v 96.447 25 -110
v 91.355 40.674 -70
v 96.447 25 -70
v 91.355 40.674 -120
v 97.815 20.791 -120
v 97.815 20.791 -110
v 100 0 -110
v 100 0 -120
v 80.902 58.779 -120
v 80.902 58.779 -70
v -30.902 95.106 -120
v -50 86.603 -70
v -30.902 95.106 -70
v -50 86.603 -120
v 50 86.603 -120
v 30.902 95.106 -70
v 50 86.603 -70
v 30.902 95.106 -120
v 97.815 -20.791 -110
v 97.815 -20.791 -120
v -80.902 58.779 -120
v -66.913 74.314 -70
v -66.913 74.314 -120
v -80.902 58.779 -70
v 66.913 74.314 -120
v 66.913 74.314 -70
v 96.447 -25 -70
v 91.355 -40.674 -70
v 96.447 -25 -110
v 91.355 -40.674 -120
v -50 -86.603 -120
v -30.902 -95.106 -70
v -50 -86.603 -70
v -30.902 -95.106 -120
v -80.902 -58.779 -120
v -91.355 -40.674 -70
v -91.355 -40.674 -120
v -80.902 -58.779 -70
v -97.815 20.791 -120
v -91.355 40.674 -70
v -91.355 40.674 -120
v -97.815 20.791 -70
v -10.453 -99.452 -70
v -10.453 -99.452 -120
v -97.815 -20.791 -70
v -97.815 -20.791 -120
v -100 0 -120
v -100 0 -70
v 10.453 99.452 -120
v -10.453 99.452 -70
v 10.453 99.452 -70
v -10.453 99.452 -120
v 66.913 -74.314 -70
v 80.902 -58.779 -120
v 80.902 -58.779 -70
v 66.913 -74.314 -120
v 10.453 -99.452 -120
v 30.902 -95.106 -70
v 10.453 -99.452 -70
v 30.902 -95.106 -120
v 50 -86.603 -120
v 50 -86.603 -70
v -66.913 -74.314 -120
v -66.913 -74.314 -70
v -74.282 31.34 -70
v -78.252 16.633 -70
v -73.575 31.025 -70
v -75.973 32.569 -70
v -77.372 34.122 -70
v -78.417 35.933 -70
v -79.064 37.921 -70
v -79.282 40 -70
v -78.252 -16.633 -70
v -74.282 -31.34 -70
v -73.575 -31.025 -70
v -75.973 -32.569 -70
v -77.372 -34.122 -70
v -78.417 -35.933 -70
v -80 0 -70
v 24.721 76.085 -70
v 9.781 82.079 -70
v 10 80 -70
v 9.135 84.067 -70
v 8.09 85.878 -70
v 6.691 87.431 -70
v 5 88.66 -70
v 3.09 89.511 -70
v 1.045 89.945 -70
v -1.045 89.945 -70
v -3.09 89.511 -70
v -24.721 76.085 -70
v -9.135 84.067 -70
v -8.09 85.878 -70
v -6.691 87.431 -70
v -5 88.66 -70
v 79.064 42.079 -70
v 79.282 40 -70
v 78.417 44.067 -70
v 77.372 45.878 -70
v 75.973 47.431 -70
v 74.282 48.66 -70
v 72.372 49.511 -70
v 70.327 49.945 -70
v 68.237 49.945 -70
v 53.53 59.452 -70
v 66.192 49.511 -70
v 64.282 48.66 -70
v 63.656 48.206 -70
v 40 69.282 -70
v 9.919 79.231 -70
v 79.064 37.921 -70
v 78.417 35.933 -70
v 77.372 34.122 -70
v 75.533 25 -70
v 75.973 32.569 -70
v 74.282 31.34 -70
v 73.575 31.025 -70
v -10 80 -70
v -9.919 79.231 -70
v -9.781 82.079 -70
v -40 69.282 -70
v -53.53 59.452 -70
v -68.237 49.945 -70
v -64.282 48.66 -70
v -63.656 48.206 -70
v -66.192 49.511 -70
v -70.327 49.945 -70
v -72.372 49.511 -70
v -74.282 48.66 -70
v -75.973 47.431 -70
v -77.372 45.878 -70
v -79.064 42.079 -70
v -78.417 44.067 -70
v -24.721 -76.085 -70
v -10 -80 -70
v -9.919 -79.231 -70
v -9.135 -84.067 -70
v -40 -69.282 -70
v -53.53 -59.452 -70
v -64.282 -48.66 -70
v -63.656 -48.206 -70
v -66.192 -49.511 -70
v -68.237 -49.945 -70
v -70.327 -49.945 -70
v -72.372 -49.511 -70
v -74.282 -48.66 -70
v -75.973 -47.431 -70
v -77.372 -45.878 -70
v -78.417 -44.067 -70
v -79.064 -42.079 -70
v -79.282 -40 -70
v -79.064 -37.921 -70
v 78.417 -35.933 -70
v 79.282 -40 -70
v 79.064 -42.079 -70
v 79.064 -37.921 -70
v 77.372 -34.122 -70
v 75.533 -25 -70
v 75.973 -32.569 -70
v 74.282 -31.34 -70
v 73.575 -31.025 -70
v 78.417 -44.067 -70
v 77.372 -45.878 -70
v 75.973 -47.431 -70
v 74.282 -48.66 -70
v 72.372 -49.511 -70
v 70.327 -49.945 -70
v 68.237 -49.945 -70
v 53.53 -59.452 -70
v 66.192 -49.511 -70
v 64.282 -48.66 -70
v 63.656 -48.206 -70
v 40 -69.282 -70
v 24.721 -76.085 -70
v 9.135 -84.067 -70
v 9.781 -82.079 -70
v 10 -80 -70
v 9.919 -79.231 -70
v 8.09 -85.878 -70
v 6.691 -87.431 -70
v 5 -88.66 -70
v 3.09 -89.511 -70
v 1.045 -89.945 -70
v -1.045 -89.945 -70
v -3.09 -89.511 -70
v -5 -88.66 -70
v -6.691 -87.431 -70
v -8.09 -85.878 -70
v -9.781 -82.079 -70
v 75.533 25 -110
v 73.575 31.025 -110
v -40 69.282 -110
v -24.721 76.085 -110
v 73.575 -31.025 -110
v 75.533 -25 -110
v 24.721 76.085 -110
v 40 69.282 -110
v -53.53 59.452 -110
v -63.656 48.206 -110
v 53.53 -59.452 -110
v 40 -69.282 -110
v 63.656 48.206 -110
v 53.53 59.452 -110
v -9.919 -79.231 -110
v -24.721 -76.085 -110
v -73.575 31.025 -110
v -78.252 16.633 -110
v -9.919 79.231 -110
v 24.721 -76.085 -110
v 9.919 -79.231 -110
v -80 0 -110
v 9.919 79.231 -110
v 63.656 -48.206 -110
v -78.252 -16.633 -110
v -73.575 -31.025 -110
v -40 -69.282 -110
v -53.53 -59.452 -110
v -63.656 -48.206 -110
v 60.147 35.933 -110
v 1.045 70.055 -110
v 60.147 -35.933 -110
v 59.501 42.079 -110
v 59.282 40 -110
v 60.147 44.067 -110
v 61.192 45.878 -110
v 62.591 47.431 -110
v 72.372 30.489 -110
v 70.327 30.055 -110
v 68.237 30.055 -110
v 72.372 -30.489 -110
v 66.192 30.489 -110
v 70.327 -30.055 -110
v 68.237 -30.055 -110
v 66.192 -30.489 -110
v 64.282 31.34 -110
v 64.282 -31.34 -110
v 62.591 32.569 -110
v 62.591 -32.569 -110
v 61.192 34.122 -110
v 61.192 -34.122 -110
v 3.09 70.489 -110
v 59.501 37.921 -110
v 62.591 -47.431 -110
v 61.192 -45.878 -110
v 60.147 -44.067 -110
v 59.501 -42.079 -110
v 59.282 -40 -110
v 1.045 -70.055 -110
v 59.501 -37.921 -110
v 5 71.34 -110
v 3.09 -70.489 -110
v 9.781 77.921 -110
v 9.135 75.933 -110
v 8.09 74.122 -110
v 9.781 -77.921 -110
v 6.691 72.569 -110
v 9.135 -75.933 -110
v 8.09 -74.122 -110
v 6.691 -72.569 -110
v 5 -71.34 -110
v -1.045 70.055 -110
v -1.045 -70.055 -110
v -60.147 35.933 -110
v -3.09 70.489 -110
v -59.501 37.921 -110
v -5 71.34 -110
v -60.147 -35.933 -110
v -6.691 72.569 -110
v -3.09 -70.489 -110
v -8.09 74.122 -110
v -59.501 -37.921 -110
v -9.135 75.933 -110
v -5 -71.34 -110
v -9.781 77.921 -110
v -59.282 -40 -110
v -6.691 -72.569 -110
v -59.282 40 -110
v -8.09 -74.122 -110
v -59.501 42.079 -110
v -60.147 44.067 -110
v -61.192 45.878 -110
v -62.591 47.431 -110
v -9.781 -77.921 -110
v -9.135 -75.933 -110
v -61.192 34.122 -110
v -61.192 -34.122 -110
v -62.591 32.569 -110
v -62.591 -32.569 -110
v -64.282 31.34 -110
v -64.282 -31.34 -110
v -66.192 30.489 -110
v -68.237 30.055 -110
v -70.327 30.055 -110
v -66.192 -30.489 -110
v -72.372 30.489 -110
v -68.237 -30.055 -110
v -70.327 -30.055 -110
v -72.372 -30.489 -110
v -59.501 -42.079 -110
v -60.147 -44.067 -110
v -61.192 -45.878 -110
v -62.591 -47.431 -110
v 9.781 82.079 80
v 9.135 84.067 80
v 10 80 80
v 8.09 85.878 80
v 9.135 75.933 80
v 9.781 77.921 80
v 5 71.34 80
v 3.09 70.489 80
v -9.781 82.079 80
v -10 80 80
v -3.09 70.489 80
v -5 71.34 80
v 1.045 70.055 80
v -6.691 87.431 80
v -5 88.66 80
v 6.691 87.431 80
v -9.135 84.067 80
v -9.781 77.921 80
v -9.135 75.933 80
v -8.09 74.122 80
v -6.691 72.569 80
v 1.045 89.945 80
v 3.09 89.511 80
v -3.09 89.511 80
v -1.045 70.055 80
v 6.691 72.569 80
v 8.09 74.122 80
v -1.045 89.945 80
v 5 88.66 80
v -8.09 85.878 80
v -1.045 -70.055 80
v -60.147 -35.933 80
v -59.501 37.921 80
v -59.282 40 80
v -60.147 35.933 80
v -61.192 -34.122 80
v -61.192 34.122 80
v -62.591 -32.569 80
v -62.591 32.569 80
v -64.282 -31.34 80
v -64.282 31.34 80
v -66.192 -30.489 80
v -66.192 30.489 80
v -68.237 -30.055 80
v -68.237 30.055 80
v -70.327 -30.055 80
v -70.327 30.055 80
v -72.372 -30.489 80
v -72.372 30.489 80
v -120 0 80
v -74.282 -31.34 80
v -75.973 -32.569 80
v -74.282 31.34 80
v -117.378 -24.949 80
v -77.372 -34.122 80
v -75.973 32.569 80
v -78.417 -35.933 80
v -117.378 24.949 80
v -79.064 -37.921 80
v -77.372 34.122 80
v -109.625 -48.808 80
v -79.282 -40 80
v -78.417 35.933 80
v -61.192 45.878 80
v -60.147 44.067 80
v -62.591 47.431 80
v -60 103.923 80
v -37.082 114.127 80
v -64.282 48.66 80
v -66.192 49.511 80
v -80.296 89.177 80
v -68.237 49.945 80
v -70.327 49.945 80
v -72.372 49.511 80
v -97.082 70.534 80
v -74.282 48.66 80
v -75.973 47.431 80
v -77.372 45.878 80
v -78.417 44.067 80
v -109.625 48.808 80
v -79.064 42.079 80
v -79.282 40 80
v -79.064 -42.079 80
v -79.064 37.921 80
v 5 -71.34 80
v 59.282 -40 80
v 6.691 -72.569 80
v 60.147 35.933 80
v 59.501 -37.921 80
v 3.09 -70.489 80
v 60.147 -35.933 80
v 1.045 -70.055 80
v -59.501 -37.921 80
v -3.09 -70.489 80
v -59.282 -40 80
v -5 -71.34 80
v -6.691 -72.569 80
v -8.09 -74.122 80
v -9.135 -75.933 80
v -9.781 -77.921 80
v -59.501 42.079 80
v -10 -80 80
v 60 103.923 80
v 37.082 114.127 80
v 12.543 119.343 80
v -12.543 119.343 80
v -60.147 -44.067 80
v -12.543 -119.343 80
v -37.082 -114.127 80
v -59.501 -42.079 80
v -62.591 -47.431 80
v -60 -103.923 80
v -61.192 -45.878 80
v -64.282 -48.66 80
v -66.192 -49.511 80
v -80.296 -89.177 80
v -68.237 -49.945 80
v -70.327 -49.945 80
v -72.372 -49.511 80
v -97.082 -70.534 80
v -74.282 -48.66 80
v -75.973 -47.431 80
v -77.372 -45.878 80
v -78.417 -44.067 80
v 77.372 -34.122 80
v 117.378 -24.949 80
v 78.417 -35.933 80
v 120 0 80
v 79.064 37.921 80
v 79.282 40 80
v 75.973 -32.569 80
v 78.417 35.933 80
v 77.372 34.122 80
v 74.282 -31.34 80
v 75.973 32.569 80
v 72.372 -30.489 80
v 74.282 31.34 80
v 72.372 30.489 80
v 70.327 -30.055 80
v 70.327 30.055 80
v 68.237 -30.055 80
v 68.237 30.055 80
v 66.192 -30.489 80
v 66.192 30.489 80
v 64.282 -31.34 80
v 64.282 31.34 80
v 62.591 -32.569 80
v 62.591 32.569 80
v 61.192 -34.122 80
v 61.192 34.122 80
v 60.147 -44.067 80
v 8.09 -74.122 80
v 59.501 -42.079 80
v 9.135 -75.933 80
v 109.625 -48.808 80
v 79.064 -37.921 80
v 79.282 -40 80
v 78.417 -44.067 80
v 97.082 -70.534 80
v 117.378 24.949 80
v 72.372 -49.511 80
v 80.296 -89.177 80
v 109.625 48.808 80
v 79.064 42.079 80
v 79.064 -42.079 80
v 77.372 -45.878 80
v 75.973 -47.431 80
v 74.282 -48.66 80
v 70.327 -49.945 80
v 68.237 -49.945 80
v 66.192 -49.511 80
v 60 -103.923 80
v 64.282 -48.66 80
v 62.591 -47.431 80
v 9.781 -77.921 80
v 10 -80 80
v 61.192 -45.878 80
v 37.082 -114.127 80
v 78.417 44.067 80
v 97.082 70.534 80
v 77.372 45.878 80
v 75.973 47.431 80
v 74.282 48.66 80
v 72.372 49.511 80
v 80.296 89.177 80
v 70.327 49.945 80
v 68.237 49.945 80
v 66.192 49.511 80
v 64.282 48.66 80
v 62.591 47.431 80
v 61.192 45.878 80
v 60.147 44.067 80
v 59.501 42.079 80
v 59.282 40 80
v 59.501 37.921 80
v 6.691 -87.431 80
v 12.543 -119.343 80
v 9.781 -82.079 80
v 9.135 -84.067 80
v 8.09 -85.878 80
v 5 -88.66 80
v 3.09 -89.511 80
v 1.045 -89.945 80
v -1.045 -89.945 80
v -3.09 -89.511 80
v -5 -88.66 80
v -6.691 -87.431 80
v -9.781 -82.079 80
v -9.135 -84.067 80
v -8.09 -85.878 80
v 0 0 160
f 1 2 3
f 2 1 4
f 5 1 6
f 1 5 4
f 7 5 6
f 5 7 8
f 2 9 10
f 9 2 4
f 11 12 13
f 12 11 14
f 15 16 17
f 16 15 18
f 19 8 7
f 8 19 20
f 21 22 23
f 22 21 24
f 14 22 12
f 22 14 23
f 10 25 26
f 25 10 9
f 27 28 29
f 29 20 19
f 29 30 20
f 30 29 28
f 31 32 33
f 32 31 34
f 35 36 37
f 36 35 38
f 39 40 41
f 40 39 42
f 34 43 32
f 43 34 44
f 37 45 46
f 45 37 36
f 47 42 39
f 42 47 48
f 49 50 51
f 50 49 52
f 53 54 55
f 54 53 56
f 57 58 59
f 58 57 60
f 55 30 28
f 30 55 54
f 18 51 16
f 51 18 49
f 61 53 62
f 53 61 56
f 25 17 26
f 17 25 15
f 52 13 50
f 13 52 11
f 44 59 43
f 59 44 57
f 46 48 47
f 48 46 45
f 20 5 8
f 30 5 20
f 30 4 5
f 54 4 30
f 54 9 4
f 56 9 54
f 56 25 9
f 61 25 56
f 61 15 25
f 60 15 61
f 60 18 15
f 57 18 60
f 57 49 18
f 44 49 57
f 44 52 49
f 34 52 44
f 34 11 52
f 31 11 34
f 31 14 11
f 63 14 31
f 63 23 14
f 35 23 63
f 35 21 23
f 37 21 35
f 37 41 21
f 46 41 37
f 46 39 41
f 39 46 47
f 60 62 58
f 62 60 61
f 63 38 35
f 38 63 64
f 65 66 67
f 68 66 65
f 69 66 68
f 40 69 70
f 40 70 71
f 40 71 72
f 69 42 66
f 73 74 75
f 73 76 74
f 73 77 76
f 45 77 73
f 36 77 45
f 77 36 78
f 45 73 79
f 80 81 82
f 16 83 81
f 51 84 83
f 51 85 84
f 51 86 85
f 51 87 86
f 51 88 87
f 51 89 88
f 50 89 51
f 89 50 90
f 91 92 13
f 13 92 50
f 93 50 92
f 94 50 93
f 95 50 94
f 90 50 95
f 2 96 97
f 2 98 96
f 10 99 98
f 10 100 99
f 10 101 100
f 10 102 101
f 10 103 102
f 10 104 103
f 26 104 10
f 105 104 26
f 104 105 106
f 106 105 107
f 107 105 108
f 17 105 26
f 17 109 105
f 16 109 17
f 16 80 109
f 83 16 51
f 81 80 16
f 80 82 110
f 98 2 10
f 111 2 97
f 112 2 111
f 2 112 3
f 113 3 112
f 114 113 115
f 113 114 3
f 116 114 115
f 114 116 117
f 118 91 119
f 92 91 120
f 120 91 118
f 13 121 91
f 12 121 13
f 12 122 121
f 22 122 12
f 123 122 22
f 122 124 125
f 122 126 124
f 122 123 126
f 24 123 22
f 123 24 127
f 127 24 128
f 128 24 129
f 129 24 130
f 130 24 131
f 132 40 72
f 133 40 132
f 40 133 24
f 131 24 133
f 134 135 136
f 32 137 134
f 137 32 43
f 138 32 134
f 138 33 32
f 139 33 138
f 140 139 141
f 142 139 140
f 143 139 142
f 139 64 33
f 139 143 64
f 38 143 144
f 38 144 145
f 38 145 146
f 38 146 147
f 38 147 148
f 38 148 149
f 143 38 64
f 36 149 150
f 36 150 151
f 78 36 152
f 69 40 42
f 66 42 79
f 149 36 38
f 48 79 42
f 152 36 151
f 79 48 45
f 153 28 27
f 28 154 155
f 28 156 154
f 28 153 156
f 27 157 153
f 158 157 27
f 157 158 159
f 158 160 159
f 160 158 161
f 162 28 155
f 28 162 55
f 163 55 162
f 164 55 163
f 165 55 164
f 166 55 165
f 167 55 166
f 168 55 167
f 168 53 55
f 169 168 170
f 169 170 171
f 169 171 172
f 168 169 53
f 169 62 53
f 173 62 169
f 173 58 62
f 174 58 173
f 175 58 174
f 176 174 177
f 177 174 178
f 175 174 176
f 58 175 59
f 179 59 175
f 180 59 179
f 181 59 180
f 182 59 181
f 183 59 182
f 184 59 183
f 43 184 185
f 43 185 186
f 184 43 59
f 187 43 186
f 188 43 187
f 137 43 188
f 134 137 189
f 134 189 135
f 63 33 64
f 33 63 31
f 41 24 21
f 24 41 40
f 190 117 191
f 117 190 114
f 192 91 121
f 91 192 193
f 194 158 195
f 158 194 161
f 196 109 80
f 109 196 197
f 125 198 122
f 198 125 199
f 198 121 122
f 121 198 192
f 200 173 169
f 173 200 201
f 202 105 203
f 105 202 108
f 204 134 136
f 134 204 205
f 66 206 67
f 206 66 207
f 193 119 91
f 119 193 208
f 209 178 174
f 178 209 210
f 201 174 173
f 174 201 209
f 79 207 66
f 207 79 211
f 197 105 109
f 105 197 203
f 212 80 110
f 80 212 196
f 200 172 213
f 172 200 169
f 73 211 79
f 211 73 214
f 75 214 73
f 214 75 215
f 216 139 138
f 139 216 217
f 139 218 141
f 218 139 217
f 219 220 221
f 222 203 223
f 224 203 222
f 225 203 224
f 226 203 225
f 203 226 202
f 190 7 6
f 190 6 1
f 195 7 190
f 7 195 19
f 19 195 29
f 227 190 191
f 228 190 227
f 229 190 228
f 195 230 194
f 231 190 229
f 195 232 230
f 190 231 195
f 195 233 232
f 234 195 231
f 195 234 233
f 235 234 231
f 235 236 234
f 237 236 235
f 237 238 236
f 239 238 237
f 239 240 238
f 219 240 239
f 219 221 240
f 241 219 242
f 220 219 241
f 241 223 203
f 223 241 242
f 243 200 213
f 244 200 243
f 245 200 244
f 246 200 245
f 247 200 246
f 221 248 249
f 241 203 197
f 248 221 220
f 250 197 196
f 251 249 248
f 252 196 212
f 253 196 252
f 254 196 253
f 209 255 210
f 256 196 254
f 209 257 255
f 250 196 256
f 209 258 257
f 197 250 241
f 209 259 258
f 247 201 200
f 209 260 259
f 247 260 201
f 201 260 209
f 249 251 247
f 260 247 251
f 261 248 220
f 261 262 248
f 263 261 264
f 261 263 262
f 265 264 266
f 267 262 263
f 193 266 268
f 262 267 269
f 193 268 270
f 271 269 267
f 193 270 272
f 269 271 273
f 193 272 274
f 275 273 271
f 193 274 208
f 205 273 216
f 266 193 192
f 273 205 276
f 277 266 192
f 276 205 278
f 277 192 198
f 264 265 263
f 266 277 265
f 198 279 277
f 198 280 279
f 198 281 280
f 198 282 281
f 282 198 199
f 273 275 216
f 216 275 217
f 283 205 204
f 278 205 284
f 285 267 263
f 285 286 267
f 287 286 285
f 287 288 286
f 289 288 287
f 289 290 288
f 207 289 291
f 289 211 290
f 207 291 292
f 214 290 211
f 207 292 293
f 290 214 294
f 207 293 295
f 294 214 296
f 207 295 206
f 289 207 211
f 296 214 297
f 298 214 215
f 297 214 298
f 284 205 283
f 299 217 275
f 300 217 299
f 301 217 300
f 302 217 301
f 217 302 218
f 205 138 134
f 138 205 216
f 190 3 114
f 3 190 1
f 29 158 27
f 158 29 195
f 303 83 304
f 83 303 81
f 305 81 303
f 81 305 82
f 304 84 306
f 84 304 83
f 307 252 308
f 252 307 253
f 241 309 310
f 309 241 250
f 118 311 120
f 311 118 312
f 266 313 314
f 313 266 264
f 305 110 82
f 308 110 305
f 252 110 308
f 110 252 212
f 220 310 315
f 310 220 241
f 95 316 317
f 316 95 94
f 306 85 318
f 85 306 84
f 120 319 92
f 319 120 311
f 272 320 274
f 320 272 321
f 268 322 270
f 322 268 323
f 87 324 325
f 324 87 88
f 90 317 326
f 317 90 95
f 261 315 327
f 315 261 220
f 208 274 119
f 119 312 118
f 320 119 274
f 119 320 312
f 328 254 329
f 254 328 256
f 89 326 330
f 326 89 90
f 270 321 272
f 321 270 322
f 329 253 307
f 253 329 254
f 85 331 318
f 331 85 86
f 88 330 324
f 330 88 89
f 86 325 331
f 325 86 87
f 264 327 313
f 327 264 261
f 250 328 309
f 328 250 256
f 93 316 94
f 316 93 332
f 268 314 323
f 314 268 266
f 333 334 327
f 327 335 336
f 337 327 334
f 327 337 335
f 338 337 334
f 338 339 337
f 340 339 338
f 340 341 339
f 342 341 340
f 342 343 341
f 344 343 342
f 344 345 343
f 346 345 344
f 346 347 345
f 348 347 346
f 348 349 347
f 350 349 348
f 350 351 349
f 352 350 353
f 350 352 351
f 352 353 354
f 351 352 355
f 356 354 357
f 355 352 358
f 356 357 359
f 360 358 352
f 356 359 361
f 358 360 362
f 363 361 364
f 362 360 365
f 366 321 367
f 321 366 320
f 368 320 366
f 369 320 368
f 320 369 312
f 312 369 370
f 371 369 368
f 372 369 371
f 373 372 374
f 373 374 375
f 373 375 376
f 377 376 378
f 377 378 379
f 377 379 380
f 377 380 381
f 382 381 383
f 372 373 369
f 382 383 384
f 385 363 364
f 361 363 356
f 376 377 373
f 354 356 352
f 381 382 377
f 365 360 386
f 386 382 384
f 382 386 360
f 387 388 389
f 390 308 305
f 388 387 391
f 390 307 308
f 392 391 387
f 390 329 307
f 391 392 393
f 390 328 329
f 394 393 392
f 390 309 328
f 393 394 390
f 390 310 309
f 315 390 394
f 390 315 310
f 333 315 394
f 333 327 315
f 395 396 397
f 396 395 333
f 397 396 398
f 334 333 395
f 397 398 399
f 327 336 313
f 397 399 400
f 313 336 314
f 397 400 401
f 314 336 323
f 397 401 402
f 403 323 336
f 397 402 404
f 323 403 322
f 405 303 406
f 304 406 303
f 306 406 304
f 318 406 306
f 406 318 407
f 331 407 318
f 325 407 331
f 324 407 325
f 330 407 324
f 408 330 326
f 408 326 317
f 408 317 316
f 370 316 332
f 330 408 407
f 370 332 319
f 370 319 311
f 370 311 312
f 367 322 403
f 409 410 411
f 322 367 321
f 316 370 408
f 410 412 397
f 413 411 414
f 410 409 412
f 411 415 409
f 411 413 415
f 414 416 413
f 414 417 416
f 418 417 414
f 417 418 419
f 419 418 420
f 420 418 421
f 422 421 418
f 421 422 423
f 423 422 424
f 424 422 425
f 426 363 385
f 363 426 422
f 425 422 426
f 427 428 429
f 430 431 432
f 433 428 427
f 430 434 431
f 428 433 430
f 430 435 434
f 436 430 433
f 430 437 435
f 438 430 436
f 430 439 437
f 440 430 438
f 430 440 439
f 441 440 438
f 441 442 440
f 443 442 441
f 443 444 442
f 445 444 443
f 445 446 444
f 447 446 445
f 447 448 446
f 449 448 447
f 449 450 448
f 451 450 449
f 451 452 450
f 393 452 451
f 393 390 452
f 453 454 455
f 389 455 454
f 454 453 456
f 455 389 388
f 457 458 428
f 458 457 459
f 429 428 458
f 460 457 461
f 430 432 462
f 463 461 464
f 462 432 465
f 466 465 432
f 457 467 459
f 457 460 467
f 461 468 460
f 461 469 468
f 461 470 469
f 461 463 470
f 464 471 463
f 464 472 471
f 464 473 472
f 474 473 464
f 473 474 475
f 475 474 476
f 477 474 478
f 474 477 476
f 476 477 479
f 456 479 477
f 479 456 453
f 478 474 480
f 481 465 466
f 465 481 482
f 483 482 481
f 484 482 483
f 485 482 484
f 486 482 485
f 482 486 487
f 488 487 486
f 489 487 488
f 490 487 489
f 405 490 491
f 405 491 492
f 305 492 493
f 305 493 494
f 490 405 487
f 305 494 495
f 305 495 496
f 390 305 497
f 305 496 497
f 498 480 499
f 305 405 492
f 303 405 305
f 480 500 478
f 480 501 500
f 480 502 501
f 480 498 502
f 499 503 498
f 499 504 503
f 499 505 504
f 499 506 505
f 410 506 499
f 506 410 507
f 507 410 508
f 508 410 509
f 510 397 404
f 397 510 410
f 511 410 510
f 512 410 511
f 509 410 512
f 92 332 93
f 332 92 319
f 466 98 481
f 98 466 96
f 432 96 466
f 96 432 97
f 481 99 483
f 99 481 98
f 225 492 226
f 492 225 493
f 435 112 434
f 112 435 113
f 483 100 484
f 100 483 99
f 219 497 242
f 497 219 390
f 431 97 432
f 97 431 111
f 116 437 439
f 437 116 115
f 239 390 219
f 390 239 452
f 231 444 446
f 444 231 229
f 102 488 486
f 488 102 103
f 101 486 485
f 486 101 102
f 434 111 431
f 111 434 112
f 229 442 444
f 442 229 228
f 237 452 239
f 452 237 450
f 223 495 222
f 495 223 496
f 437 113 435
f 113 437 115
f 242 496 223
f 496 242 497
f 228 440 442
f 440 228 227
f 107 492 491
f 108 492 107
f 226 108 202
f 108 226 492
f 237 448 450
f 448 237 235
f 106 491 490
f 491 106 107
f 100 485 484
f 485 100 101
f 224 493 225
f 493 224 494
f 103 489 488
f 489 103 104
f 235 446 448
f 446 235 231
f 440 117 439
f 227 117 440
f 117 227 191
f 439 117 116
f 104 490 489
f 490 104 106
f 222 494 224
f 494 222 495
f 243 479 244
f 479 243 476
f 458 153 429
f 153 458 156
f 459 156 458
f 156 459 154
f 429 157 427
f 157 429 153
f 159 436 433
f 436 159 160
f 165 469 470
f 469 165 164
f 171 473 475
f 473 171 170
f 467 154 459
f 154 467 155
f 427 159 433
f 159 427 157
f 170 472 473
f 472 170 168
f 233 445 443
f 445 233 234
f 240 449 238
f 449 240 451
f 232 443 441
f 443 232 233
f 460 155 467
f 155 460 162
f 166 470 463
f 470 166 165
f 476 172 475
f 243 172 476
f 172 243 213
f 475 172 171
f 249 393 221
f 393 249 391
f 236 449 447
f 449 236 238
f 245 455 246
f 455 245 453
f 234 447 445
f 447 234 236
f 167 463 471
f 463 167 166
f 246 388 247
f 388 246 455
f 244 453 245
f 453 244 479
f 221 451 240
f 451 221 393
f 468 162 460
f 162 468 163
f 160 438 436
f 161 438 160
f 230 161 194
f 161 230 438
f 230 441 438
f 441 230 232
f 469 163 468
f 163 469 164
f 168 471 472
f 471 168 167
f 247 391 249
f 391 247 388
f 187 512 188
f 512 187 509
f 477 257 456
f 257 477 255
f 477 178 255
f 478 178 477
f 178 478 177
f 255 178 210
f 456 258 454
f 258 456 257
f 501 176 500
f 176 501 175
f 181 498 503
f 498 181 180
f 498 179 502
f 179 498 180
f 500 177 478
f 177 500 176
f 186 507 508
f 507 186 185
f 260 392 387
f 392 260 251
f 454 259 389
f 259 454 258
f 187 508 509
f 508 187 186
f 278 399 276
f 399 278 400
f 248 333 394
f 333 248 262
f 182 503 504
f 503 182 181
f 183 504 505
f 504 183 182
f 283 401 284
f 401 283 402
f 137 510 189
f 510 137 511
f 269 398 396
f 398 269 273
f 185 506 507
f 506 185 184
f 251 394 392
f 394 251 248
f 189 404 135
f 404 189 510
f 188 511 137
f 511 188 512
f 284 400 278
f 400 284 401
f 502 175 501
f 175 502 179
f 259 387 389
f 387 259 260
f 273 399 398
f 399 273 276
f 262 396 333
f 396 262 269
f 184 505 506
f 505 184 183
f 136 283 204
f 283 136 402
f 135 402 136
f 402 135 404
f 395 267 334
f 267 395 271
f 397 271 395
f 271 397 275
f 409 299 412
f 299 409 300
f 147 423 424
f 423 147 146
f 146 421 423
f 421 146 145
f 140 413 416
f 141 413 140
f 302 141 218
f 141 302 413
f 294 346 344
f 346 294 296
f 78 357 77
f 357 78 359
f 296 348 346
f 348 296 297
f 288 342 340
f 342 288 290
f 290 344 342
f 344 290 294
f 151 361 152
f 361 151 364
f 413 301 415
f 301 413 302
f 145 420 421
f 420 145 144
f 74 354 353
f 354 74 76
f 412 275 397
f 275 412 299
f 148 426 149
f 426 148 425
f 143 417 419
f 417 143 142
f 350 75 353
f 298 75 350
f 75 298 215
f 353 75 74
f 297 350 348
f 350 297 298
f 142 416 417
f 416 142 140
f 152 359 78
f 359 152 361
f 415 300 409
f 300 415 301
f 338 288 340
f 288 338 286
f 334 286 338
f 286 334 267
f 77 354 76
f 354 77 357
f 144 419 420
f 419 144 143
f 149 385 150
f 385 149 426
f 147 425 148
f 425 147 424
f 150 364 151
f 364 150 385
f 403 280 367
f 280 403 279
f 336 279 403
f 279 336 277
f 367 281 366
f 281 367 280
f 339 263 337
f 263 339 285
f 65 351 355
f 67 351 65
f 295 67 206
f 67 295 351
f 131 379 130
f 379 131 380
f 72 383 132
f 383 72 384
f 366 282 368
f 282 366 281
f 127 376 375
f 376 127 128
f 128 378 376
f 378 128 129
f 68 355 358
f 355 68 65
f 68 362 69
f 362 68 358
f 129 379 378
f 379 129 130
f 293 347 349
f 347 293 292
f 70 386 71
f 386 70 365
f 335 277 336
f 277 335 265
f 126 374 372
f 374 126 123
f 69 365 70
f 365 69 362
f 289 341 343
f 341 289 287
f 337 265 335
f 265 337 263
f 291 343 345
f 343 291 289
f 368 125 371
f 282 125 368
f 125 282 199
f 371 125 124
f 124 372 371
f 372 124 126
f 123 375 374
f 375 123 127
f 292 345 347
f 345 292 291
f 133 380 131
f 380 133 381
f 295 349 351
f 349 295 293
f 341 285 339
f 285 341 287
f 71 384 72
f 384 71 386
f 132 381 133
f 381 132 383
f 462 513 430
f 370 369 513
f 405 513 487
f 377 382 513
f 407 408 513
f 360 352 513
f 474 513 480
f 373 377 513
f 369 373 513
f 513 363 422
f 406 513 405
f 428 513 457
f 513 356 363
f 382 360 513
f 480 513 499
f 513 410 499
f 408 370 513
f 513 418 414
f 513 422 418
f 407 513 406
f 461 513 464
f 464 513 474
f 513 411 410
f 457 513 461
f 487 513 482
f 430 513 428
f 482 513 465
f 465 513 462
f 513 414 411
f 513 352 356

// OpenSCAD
module example005()
{
	translate([0, 0, -120]) {
		difference() {
			cylinder(h = 50, r = 100);
			translate([0, 0, 10]) cylinder(h = 50, r = 80);
			translate([100, 0, 35]) cube(50, center = true);
		}
		for (i = [0:5]) {
			echo(360*i/6, sin(360*i/6)*80, cos(360*i/6)*80);
			translate([sin(360*i/6)*80, cos(360*i/6)*80, 0 ])
				cylinder(h = 200, r=10);
		}
		translate([0, 0, 200])
			cylinder(h = 80, r1 = 120, r2 = 0);
	}
}

echo(version=version());

example005();

// Written by Clifford Wolf <clifford@clifford.at> and Marius
// Kintel <marius@kintel.net>
//
// To the extent possible under law, the author(s) have dedicated all
// copyright and related and neighboring rights to this software to the
// public domain worldwide. This software is distributed without any
// warranty.
//
// You should have received a copy of the CC0 Public Domain
// Dedication along with this software.
// If not, see <http://creativecommons.org/publicdomain/zero/1.0/>.
